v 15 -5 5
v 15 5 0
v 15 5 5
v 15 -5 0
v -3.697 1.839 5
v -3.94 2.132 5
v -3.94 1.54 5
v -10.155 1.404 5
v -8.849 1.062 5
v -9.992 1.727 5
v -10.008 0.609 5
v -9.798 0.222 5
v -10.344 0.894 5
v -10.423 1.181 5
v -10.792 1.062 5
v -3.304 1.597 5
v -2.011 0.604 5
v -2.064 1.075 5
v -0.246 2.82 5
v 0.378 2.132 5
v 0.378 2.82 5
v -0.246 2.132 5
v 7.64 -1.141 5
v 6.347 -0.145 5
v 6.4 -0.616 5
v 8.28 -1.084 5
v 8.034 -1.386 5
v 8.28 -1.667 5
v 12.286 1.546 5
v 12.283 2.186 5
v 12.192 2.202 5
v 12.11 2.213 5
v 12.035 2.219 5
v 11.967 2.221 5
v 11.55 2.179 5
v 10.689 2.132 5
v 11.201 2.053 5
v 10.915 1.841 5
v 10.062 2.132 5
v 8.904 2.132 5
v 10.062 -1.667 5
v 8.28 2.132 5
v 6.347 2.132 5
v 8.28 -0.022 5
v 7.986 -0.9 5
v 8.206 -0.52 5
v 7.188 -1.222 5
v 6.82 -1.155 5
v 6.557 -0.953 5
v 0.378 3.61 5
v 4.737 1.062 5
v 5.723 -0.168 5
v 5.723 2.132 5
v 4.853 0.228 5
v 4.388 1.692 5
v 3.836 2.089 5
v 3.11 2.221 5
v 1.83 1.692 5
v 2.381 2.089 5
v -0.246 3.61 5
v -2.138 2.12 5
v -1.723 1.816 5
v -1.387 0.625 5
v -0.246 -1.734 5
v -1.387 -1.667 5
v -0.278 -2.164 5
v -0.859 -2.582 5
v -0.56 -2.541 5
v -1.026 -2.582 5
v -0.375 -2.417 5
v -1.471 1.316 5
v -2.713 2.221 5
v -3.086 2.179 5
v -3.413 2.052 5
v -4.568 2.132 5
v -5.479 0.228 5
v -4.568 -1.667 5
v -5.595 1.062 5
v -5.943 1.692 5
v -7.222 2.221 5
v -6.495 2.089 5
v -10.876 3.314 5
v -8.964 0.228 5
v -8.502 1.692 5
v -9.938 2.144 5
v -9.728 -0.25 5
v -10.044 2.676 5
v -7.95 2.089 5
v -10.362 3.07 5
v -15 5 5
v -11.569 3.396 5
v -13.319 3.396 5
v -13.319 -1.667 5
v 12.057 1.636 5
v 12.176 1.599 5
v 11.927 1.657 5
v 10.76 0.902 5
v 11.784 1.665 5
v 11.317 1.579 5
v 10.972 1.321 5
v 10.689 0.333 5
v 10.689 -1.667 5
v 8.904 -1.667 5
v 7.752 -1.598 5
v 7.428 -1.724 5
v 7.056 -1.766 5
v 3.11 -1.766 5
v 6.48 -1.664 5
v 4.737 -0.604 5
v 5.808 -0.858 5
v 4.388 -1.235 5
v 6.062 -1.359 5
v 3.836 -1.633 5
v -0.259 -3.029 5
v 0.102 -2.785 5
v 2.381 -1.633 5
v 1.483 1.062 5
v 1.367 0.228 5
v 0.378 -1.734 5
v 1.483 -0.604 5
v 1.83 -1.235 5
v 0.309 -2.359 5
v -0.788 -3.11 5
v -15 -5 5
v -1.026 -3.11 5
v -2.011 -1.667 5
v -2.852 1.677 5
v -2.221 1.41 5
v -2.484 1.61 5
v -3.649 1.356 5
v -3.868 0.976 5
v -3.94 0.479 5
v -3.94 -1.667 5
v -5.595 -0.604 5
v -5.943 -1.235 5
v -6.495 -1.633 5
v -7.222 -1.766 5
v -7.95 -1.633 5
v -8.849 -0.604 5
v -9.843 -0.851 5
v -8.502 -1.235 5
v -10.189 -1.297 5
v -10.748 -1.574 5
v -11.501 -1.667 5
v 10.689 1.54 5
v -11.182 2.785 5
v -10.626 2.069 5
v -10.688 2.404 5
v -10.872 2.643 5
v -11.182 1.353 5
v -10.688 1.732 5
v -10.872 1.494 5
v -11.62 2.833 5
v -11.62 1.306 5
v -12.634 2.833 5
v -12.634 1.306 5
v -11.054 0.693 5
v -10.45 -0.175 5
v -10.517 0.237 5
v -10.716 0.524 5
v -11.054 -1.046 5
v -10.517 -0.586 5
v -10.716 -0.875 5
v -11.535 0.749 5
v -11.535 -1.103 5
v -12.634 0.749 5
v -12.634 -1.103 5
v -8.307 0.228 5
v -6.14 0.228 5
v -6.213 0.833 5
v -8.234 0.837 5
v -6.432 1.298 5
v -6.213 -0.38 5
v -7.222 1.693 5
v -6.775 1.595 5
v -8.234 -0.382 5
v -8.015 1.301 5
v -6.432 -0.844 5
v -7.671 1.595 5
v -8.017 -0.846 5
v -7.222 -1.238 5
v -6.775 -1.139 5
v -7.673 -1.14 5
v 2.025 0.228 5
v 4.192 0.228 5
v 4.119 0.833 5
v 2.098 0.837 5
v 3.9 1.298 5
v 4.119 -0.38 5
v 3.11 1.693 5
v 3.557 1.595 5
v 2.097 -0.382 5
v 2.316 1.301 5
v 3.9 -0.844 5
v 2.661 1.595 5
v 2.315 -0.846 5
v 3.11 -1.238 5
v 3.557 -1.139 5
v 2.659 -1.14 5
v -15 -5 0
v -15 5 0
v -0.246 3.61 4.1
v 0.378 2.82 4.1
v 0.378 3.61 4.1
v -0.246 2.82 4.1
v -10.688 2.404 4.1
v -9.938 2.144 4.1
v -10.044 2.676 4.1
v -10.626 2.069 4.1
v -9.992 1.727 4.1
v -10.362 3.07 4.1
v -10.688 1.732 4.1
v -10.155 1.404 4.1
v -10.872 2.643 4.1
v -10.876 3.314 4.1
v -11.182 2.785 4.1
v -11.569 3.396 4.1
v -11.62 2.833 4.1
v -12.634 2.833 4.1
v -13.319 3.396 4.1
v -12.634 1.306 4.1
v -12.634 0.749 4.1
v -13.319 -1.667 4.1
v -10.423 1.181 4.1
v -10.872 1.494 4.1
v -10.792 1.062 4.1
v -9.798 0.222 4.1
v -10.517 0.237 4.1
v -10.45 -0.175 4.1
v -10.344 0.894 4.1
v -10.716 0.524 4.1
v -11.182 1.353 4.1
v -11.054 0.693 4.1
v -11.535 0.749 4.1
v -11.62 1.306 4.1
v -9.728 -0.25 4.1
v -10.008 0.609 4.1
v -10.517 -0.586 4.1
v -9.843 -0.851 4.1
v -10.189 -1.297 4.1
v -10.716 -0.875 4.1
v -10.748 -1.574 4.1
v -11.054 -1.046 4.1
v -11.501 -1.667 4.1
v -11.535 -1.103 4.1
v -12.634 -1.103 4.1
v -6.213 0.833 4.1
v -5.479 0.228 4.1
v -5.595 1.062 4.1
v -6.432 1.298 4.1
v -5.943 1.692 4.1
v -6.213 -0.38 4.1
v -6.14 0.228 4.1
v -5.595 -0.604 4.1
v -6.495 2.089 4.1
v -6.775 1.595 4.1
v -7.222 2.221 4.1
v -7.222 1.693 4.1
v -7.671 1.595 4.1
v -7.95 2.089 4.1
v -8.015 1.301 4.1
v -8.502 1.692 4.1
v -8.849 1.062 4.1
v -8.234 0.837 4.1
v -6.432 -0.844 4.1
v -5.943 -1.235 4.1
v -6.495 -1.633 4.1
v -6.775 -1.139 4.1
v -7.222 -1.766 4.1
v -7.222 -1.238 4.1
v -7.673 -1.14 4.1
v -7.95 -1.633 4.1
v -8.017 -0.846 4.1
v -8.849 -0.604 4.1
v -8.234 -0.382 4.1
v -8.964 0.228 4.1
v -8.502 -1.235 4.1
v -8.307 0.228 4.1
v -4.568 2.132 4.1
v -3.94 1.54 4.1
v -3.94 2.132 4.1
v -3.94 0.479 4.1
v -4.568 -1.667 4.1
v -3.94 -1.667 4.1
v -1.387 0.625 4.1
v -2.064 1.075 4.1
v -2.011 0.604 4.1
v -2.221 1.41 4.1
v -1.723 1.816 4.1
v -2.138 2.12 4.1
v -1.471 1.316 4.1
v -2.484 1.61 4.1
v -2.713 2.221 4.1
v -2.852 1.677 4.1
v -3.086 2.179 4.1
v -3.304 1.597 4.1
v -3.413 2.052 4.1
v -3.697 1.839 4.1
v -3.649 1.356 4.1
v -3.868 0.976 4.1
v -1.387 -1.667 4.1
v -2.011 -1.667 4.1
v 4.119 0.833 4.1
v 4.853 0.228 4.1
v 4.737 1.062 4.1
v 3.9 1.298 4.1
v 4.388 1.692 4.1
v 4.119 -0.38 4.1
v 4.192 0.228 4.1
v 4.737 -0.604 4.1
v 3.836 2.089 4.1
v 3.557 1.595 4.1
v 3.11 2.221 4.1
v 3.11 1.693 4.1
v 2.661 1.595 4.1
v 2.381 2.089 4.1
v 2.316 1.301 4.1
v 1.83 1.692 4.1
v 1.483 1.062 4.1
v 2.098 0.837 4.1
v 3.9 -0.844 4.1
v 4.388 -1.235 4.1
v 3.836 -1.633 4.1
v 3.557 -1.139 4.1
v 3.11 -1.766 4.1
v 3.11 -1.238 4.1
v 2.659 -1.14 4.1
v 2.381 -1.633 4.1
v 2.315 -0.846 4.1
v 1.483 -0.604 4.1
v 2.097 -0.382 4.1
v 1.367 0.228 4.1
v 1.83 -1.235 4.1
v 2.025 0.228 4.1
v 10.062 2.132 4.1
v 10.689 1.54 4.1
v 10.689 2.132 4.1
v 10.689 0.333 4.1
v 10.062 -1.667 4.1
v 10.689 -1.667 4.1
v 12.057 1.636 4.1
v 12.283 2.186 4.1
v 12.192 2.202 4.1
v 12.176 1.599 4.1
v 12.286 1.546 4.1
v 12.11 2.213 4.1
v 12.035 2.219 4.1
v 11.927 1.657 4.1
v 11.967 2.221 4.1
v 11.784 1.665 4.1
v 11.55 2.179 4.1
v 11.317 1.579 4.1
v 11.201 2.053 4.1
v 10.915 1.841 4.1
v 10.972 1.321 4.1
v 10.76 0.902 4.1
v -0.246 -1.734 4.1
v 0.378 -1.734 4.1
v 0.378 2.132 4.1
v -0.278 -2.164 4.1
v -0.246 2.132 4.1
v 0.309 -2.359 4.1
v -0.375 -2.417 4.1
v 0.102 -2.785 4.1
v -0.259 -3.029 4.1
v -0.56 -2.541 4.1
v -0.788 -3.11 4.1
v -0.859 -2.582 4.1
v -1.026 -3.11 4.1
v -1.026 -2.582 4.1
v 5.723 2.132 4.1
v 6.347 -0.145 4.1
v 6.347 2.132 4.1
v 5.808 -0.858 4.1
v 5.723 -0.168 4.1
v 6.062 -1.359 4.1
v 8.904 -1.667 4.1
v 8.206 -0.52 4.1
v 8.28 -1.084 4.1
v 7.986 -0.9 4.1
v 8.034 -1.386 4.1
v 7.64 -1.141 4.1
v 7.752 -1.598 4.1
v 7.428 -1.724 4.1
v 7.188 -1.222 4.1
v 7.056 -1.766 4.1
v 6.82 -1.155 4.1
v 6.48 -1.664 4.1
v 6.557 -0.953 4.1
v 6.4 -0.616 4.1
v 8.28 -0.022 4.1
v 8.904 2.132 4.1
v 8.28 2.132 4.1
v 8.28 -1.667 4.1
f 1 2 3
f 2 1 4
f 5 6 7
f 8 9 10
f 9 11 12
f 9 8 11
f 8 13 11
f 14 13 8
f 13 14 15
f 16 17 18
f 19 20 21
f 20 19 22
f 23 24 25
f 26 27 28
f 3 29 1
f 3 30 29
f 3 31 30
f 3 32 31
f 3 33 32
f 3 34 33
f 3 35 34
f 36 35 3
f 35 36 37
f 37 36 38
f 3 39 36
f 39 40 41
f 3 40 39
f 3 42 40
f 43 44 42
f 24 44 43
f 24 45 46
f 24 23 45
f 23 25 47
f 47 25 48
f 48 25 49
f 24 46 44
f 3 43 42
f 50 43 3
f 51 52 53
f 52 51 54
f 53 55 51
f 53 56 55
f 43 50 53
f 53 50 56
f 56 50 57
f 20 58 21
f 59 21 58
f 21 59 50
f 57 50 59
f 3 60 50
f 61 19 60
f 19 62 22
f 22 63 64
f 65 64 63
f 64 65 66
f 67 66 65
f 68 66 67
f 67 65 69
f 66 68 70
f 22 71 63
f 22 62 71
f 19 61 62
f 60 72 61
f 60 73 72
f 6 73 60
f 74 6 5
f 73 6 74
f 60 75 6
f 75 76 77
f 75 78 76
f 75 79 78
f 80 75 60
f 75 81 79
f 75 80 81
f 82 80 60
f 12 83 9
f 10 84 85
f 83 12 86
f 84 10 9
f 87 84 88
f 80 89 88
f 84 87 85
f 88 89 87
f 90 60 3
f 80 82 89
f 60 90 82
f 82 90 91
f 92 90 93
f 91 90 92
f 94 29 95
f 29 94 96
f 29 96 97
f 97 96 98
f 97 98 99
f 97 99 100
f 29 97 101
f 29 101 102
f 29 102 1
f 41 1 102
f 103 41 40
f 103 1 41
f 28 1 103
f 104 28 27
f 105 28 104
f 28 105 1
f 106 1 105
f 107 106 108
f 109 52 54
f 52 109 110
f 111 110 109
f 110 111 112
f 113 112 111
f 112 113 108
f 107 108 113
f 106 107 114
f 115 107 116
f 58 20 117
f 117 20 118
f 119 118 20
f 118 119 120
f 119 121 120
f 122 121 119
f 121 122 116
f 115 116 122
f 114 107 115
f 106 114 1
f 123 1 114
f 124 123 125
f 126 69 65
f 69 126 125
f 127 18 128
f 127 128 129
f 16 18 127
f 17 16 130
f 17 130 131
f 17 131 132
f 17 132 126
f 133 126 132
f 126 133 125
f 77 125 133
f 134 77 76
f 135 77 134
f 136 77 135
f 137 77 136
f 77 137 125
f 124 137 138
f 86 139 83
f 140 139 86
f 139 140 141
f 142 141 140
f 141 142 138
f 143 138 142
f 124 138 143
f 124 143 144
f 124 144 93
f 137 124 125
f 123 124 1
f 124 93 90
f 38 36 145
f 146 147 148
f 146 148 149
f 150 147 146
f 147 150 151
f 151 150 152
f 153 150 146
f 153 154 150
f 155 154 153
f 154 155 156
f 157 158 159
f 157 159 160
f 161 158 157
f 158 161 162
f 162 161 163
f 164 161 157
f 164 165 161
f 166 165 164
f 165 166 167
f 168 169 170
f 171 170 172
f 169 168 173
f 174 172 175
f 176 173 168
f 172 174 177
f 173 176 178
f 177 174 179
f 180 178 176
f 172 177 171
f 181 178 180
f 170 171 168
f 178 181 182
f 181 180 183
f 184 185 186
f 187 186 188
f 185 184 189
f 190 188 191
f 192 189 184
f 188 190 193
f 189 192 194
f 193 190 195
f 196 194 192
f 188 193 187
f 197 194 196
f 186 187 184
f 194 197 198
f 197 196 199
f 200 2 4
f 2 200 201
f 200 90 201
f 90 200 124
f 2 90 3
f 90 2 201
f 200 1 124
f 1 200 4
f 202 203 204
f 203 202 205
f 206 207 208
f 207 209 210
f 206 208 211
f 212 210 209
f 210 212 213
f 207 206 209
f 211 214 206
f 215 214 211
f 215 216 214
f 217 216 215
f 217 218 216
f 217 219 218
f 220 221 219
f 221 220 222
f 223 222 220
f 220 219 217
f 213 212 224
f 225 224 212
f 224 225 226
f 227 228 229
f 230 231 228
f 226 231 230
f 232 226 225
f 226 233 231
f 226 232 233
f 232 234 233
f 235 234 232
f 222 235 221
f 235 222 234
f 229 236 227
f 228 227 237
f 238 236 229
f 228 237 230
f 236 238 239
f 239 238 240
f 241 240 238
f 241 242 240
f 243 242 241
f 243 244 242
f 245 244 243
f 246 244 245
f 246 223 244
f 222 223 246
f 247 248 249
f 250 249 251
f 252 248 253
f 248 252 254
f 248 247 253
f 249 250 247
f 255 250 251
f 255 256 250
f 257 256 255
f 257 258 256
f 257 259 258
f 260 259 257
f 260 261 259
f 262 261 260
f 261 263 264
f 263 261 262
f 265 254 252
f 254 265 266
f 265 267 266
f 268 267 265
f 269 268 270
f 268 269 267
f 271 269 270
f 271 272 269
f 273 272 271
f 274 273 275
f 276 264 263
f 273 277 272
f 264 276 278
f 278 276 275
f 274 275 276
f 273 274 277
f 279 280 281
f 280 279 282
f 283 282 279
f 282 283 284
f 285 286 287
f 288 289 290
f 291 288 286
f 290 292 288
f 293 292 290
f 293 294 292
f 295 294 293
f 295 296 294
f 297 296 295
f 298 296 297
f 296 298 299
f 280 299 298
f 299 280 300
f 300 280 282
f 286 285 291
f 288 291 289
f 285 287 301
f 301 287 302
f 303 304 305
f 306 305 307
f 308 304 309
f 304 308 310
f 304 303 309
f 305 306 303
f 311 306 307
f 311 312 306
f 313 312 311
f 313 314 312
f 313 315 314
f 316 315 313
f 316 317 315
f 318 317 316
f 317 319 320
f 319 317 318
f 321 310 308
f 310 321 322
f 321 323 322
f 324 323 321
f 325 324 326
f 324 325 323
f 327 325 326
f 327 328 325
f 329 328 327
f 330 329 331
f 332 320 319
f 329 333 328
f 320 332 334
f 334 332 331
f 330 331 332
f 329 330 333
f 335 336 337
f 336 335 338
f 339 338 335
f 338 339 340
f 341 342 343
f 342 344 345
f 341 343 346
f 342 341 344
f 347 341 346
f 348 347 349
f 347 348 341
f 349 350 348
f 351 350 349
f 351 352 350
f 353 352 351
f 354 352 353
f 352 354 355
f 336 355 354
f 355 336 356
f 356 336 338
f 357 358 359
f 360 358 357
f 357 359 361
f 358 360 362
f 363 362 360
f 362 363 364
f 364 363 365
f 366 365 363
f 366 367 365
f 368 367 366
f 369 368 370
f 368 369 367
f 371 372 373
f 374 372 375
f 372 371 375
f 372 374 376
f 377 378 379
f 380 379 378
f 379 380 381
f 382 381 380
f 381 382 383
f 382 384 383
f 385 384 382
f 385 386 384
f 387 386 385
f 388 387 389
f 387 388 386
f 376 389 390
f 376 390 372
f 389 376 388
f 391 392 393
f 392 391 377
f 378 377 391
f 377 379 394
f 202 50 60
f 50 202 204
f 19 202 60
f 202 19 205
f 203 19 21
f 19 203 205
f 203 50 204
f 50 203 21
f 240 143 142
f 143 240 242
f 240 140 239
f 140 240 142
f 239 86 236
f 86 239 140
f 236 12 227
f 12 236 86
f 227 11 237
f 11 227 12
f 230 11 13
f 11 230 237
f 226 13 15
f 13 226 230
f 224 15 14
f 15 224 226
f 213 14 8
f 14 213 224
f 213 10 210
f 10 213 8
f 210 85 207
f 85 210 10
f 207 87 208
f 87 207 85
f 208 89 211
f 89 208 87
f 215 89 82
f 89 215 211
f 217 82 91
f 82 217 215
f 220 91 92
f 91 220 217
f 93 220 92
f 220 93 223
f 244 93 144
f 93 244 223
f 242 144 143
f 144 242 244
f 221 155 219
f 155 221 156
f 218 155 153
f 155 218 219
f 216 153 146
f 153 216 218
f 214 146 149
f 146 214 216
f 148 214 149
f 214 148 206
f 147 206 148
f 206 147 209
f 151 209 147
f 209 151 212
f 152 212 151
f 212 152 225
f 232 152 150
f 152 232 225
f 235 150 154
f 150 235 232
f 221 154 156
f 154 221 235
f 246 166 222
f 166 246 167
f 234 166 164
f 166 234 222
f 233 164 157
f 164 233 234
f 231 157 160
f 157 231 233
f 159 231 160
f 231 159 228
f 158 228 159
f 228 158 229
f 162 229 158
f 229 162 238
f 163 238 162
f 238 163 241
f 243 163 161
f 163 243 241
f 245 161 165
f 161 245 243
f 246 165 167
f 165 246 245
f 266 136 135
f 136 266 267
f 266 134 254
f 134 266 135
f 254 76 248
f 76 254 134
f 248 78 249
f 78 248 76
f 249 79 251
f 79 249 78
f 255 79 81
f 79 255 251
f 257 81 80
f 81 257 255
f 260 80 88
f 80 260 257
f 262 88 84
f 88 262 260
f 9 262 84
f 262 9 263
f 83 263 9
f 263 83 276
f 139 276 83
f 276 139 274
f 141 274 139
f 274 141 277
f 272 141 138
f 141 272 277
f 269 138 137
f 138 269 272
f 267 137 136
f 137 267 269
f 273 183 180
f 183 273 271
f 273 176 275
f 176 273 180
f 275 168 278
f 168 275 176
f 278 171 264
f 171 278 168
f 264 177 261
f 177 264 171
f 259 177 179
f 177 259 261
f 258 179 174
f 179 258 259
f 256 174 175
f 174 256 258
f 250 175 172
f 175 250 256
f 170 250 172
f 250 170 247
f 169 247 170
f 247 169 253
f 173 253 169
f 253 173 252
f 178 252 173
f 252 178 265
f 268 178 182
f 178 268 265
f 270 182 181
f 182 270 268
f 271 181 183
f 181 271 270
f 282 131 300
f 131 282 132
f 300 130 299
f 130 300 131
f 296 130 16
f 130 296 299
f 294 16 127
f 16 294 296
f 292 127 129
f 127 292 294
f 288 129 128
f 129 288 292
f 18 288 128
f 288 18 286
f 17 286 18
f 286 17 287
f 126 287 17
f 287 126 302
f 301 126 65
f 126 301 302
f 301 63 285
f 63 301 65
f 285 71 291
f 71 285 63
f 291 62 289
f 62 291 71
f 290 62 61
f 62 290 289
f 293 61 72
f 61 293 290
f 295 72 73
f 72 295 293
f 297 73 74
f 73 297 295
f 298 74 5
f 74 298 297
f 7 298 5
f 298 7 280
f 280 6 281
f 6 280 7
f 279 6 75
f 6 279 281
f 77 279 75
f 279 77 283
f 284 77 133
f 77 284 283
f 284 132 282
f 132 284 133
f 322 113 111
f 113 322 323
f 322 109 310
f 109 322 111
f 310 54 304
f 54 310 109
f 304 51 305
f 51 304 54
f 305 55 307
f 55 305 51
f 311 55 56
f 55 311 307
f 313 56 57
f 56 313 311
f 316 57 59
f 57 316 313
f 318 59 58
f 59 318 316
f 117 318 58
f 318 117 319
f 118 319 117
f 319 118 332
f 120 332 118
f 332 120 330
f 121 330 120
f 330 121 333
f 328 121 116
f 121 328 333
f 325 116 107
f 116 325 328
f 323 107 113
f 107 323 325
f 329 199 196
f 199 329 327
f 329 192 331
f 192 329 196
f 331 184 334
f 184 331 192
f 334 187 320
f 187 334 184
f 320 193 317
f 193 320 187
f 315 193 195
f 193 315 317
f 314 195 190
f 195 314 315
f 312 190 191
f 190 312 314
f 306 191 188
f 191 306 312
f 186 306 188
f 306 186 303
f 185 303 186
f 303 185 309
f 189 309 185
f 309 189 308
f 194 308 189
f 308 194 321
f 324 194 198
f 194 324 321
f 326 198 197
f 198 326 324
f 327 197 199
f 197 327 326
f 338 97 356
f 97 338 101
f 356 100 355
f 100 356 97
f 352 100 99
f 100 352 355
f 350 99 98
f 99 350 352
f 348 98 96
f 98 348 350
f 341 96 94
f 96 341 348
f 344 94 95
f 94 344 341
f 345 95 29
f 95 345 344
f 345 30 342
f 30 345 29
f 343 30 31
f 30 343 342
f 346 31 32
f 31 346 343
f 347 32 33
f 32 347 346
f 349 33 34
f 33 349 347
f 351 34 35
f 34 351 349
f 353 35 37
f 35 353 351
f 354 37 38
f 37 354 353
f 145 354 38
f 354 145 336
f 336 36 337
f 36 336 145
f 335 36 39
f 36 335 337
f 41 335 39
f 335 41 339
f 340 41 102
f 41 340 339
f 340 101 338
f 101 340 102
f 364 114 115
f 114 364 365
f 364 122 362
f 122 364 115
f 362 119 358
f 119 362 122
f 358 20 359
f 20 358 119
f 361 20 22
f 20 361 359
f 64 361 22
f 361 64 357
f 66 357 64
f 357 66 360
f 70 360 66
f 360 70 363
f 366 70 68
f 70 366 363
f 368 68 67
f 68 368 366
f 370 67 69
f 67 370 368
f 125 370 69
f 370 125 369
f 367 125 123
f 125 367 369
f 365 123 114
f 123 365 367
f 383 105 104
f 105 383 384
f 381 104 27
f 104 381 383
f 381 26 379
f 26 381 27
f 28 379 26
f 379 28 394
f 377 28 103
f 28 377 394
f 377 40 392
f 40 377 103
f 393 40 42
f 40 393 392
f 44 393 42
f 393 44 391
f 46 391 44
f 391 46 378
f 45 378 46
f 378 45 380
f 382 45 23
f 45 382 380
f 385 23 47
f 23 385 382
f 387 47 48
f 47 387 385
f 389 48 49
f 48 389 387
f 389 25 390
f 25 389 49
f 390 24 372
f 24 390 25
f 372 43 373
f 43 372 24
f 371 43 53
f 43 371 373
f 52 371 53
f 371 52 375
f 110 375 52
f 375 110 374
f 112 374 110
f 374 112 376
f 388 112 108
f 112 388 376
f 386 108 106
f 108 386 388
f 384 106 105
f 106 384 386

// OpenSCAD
$fn = 1; 
texte_a_inserer = "Bonjour"; 
taille = 5; 
police = "DejaVuSans"; //[[Abril Fatface,Aclonica,Acme,Advent Pro,Akronim,Aladin,Alegreya,Alegreya Sans,Alegreya SC,Alex Brush,Alfa Slab One,Alice,Amaranth,Architects Daughter,Archivo Black,Archivo Narrow,Arimo,Arvo,Asap,Astloch,Asul,Averia Libre,Averia Serif Libre,Bangers,Basic,Belgrano,Berkshire Swash,Bigshot One,Bilbo Swash Caps,Black Ops One,Bonbon,Bowlby One SC,Brawler,Bubblegum Sans,Butterfly Kids,Cabin Condensed,Caesar Dressing,Cagliostro,Calligraffitti,Capriola,Carter One,Changa One,Chango,Chelsea Market,Cherry Cream Soda,Chewy,Chicle,Chivo,Clicker Script,Coming Soon,Concert One,Condiment,Cookie,Courgette,Covered By Your Grace,Crimson Text,Dancing Script,DejaVu Sans,DejaVu Serif,Dhurjati,Doppio One,Dosis,Droid Sans,Eagle Lake,Electrolize,Emilys Candy,Encode Sans,Encode Sans Compressed,Euphoria Script,Exo,Exo 2,Faster One,Federo,Finger Paint,Fjord One,Fontdiner Swanky,Freckle Face,Fruktur,Gabriela,Geo,Germania One,Give You Glory,Gloria Hallelujah,Goudy Bookletter 1911,Graduate,Grand Hotel,Great Vibes,Griffy,Hanalei Fill,Happy Monkey,Henny Penny,Hind,IM Fell English SC,Indie Flower,Irish Grover,Italianno,Jacques Francois Shadow,Jolly Lodger,Josefin Slab,Joti One,Judson,Just Another Hand,Kalam,Kameron,Karma,Kavoon,Knewave,Kranky,Kristi,Laila,Lakki Reddy,Lancelot,Lato,Leckerli One,Ledger,Lekton,Lemon One,Liberation Sans,Libre Caslon Text,Life Savers,Lilita One,Lily Script One,Limelight,Lobster,Lobster Two,Londrina Outline,Londrina Shadow,Londrina Solid,Lora,Love Ya Like A Sister,Loved by the King,Lovers Quarrel,Luckiest Guy,Lusitana,Macondo,Macondo Swash Caps,Mako,Marck Script,Margarine,Marko One,Maven Pro,McLaren,MedievalSharp,Merienda One,Merriweather,Mervale Script,Metal Mania,Metrophobic,Milonga,Miltonian Tattoo,Miss Fajardose,Molle,Montez,Montserrat,Mr De Haviland,Mystery Quest,Neucha,New Rocker,Niconne,Nosifer,Nothing You Could Do,Noto Sans Oriya,Noto Serif,Nova Square,Nunito,Old Standard TT,Oleo Script,Oleo Script Swash Caps,Orbitron,Oregano,Orienta,Original Surfer,Oswald,Over the Rainbow,Overlock,Oxygen,Pacifico,Paprika,Parisienne,Patrick Hand SC,Paytone One,Peralta,Permanent Marker,Piedra,Pirata One,Play,Playball,Poetsen One,Poppins,Press Start 2P,Princess Sofia,PT Mono,Qwigley,Racing Sans One,Raleway,Rancho,Ranga,Ribeye,Roboto,Roboto Condensed,Roboto Slab,Rochester,Rock Salt,Rubik One,Sail,Salsa,Sansita One,Sarina,Satisfy,Schoolbell,Seaweed Script,Sevillana,Shadows Into Light,Shadows Into Light Two,Share,Six Caps,Skranji,Source Sans Pro,Spicy Rice,Stardos Stencil,Stoke,Syncopate,Teko,Terminal Dosis,The Girl Next Door,Tillana,Timmana,Titillium Web,Ubuntu,Ultra,Underdog,UnifrakturCook,UnifrakturMaguntia,Vampiro One,Vidaloka,Viga,Voces,Volkhov,Vollkorn,Voltaire,Waiting for the Sunrise,Wallpoet,Wellfleet,Wendy One,Yellowtail,Yesteryear,Zeyada]]
hauteur = 1; 
longueur_cube = 30; 
largeur_cube = 10; 
hauteur_cube = 5; 
relief_extrusion = "extru"; //[relief,extru]
module rendu(){
linear_extrude(hauteur) text(texte_a_inserer,size = taille, font = police);
}
module finao(){
if ( relief_extrusion == "relief") {
   union(){
 translate([0,0,0])   cube([longueur_cube,largeur_cube,hauteur_cube]);
translate([1,(largeur_cube/3),hauteur_cube]) rendu();
   } 
}
else
{
difference(){
 translate([0,0,0])   cube([longueur_cube,largeur_cube,hauteur_cube]);
translate([1,(largeur_cube/3),(hauteur_cube -hauteur+0.1)]) rendu();
}
 }
}
translate ([-(longueur_cube/2),-(largeur_cube/2),0]) finao();
